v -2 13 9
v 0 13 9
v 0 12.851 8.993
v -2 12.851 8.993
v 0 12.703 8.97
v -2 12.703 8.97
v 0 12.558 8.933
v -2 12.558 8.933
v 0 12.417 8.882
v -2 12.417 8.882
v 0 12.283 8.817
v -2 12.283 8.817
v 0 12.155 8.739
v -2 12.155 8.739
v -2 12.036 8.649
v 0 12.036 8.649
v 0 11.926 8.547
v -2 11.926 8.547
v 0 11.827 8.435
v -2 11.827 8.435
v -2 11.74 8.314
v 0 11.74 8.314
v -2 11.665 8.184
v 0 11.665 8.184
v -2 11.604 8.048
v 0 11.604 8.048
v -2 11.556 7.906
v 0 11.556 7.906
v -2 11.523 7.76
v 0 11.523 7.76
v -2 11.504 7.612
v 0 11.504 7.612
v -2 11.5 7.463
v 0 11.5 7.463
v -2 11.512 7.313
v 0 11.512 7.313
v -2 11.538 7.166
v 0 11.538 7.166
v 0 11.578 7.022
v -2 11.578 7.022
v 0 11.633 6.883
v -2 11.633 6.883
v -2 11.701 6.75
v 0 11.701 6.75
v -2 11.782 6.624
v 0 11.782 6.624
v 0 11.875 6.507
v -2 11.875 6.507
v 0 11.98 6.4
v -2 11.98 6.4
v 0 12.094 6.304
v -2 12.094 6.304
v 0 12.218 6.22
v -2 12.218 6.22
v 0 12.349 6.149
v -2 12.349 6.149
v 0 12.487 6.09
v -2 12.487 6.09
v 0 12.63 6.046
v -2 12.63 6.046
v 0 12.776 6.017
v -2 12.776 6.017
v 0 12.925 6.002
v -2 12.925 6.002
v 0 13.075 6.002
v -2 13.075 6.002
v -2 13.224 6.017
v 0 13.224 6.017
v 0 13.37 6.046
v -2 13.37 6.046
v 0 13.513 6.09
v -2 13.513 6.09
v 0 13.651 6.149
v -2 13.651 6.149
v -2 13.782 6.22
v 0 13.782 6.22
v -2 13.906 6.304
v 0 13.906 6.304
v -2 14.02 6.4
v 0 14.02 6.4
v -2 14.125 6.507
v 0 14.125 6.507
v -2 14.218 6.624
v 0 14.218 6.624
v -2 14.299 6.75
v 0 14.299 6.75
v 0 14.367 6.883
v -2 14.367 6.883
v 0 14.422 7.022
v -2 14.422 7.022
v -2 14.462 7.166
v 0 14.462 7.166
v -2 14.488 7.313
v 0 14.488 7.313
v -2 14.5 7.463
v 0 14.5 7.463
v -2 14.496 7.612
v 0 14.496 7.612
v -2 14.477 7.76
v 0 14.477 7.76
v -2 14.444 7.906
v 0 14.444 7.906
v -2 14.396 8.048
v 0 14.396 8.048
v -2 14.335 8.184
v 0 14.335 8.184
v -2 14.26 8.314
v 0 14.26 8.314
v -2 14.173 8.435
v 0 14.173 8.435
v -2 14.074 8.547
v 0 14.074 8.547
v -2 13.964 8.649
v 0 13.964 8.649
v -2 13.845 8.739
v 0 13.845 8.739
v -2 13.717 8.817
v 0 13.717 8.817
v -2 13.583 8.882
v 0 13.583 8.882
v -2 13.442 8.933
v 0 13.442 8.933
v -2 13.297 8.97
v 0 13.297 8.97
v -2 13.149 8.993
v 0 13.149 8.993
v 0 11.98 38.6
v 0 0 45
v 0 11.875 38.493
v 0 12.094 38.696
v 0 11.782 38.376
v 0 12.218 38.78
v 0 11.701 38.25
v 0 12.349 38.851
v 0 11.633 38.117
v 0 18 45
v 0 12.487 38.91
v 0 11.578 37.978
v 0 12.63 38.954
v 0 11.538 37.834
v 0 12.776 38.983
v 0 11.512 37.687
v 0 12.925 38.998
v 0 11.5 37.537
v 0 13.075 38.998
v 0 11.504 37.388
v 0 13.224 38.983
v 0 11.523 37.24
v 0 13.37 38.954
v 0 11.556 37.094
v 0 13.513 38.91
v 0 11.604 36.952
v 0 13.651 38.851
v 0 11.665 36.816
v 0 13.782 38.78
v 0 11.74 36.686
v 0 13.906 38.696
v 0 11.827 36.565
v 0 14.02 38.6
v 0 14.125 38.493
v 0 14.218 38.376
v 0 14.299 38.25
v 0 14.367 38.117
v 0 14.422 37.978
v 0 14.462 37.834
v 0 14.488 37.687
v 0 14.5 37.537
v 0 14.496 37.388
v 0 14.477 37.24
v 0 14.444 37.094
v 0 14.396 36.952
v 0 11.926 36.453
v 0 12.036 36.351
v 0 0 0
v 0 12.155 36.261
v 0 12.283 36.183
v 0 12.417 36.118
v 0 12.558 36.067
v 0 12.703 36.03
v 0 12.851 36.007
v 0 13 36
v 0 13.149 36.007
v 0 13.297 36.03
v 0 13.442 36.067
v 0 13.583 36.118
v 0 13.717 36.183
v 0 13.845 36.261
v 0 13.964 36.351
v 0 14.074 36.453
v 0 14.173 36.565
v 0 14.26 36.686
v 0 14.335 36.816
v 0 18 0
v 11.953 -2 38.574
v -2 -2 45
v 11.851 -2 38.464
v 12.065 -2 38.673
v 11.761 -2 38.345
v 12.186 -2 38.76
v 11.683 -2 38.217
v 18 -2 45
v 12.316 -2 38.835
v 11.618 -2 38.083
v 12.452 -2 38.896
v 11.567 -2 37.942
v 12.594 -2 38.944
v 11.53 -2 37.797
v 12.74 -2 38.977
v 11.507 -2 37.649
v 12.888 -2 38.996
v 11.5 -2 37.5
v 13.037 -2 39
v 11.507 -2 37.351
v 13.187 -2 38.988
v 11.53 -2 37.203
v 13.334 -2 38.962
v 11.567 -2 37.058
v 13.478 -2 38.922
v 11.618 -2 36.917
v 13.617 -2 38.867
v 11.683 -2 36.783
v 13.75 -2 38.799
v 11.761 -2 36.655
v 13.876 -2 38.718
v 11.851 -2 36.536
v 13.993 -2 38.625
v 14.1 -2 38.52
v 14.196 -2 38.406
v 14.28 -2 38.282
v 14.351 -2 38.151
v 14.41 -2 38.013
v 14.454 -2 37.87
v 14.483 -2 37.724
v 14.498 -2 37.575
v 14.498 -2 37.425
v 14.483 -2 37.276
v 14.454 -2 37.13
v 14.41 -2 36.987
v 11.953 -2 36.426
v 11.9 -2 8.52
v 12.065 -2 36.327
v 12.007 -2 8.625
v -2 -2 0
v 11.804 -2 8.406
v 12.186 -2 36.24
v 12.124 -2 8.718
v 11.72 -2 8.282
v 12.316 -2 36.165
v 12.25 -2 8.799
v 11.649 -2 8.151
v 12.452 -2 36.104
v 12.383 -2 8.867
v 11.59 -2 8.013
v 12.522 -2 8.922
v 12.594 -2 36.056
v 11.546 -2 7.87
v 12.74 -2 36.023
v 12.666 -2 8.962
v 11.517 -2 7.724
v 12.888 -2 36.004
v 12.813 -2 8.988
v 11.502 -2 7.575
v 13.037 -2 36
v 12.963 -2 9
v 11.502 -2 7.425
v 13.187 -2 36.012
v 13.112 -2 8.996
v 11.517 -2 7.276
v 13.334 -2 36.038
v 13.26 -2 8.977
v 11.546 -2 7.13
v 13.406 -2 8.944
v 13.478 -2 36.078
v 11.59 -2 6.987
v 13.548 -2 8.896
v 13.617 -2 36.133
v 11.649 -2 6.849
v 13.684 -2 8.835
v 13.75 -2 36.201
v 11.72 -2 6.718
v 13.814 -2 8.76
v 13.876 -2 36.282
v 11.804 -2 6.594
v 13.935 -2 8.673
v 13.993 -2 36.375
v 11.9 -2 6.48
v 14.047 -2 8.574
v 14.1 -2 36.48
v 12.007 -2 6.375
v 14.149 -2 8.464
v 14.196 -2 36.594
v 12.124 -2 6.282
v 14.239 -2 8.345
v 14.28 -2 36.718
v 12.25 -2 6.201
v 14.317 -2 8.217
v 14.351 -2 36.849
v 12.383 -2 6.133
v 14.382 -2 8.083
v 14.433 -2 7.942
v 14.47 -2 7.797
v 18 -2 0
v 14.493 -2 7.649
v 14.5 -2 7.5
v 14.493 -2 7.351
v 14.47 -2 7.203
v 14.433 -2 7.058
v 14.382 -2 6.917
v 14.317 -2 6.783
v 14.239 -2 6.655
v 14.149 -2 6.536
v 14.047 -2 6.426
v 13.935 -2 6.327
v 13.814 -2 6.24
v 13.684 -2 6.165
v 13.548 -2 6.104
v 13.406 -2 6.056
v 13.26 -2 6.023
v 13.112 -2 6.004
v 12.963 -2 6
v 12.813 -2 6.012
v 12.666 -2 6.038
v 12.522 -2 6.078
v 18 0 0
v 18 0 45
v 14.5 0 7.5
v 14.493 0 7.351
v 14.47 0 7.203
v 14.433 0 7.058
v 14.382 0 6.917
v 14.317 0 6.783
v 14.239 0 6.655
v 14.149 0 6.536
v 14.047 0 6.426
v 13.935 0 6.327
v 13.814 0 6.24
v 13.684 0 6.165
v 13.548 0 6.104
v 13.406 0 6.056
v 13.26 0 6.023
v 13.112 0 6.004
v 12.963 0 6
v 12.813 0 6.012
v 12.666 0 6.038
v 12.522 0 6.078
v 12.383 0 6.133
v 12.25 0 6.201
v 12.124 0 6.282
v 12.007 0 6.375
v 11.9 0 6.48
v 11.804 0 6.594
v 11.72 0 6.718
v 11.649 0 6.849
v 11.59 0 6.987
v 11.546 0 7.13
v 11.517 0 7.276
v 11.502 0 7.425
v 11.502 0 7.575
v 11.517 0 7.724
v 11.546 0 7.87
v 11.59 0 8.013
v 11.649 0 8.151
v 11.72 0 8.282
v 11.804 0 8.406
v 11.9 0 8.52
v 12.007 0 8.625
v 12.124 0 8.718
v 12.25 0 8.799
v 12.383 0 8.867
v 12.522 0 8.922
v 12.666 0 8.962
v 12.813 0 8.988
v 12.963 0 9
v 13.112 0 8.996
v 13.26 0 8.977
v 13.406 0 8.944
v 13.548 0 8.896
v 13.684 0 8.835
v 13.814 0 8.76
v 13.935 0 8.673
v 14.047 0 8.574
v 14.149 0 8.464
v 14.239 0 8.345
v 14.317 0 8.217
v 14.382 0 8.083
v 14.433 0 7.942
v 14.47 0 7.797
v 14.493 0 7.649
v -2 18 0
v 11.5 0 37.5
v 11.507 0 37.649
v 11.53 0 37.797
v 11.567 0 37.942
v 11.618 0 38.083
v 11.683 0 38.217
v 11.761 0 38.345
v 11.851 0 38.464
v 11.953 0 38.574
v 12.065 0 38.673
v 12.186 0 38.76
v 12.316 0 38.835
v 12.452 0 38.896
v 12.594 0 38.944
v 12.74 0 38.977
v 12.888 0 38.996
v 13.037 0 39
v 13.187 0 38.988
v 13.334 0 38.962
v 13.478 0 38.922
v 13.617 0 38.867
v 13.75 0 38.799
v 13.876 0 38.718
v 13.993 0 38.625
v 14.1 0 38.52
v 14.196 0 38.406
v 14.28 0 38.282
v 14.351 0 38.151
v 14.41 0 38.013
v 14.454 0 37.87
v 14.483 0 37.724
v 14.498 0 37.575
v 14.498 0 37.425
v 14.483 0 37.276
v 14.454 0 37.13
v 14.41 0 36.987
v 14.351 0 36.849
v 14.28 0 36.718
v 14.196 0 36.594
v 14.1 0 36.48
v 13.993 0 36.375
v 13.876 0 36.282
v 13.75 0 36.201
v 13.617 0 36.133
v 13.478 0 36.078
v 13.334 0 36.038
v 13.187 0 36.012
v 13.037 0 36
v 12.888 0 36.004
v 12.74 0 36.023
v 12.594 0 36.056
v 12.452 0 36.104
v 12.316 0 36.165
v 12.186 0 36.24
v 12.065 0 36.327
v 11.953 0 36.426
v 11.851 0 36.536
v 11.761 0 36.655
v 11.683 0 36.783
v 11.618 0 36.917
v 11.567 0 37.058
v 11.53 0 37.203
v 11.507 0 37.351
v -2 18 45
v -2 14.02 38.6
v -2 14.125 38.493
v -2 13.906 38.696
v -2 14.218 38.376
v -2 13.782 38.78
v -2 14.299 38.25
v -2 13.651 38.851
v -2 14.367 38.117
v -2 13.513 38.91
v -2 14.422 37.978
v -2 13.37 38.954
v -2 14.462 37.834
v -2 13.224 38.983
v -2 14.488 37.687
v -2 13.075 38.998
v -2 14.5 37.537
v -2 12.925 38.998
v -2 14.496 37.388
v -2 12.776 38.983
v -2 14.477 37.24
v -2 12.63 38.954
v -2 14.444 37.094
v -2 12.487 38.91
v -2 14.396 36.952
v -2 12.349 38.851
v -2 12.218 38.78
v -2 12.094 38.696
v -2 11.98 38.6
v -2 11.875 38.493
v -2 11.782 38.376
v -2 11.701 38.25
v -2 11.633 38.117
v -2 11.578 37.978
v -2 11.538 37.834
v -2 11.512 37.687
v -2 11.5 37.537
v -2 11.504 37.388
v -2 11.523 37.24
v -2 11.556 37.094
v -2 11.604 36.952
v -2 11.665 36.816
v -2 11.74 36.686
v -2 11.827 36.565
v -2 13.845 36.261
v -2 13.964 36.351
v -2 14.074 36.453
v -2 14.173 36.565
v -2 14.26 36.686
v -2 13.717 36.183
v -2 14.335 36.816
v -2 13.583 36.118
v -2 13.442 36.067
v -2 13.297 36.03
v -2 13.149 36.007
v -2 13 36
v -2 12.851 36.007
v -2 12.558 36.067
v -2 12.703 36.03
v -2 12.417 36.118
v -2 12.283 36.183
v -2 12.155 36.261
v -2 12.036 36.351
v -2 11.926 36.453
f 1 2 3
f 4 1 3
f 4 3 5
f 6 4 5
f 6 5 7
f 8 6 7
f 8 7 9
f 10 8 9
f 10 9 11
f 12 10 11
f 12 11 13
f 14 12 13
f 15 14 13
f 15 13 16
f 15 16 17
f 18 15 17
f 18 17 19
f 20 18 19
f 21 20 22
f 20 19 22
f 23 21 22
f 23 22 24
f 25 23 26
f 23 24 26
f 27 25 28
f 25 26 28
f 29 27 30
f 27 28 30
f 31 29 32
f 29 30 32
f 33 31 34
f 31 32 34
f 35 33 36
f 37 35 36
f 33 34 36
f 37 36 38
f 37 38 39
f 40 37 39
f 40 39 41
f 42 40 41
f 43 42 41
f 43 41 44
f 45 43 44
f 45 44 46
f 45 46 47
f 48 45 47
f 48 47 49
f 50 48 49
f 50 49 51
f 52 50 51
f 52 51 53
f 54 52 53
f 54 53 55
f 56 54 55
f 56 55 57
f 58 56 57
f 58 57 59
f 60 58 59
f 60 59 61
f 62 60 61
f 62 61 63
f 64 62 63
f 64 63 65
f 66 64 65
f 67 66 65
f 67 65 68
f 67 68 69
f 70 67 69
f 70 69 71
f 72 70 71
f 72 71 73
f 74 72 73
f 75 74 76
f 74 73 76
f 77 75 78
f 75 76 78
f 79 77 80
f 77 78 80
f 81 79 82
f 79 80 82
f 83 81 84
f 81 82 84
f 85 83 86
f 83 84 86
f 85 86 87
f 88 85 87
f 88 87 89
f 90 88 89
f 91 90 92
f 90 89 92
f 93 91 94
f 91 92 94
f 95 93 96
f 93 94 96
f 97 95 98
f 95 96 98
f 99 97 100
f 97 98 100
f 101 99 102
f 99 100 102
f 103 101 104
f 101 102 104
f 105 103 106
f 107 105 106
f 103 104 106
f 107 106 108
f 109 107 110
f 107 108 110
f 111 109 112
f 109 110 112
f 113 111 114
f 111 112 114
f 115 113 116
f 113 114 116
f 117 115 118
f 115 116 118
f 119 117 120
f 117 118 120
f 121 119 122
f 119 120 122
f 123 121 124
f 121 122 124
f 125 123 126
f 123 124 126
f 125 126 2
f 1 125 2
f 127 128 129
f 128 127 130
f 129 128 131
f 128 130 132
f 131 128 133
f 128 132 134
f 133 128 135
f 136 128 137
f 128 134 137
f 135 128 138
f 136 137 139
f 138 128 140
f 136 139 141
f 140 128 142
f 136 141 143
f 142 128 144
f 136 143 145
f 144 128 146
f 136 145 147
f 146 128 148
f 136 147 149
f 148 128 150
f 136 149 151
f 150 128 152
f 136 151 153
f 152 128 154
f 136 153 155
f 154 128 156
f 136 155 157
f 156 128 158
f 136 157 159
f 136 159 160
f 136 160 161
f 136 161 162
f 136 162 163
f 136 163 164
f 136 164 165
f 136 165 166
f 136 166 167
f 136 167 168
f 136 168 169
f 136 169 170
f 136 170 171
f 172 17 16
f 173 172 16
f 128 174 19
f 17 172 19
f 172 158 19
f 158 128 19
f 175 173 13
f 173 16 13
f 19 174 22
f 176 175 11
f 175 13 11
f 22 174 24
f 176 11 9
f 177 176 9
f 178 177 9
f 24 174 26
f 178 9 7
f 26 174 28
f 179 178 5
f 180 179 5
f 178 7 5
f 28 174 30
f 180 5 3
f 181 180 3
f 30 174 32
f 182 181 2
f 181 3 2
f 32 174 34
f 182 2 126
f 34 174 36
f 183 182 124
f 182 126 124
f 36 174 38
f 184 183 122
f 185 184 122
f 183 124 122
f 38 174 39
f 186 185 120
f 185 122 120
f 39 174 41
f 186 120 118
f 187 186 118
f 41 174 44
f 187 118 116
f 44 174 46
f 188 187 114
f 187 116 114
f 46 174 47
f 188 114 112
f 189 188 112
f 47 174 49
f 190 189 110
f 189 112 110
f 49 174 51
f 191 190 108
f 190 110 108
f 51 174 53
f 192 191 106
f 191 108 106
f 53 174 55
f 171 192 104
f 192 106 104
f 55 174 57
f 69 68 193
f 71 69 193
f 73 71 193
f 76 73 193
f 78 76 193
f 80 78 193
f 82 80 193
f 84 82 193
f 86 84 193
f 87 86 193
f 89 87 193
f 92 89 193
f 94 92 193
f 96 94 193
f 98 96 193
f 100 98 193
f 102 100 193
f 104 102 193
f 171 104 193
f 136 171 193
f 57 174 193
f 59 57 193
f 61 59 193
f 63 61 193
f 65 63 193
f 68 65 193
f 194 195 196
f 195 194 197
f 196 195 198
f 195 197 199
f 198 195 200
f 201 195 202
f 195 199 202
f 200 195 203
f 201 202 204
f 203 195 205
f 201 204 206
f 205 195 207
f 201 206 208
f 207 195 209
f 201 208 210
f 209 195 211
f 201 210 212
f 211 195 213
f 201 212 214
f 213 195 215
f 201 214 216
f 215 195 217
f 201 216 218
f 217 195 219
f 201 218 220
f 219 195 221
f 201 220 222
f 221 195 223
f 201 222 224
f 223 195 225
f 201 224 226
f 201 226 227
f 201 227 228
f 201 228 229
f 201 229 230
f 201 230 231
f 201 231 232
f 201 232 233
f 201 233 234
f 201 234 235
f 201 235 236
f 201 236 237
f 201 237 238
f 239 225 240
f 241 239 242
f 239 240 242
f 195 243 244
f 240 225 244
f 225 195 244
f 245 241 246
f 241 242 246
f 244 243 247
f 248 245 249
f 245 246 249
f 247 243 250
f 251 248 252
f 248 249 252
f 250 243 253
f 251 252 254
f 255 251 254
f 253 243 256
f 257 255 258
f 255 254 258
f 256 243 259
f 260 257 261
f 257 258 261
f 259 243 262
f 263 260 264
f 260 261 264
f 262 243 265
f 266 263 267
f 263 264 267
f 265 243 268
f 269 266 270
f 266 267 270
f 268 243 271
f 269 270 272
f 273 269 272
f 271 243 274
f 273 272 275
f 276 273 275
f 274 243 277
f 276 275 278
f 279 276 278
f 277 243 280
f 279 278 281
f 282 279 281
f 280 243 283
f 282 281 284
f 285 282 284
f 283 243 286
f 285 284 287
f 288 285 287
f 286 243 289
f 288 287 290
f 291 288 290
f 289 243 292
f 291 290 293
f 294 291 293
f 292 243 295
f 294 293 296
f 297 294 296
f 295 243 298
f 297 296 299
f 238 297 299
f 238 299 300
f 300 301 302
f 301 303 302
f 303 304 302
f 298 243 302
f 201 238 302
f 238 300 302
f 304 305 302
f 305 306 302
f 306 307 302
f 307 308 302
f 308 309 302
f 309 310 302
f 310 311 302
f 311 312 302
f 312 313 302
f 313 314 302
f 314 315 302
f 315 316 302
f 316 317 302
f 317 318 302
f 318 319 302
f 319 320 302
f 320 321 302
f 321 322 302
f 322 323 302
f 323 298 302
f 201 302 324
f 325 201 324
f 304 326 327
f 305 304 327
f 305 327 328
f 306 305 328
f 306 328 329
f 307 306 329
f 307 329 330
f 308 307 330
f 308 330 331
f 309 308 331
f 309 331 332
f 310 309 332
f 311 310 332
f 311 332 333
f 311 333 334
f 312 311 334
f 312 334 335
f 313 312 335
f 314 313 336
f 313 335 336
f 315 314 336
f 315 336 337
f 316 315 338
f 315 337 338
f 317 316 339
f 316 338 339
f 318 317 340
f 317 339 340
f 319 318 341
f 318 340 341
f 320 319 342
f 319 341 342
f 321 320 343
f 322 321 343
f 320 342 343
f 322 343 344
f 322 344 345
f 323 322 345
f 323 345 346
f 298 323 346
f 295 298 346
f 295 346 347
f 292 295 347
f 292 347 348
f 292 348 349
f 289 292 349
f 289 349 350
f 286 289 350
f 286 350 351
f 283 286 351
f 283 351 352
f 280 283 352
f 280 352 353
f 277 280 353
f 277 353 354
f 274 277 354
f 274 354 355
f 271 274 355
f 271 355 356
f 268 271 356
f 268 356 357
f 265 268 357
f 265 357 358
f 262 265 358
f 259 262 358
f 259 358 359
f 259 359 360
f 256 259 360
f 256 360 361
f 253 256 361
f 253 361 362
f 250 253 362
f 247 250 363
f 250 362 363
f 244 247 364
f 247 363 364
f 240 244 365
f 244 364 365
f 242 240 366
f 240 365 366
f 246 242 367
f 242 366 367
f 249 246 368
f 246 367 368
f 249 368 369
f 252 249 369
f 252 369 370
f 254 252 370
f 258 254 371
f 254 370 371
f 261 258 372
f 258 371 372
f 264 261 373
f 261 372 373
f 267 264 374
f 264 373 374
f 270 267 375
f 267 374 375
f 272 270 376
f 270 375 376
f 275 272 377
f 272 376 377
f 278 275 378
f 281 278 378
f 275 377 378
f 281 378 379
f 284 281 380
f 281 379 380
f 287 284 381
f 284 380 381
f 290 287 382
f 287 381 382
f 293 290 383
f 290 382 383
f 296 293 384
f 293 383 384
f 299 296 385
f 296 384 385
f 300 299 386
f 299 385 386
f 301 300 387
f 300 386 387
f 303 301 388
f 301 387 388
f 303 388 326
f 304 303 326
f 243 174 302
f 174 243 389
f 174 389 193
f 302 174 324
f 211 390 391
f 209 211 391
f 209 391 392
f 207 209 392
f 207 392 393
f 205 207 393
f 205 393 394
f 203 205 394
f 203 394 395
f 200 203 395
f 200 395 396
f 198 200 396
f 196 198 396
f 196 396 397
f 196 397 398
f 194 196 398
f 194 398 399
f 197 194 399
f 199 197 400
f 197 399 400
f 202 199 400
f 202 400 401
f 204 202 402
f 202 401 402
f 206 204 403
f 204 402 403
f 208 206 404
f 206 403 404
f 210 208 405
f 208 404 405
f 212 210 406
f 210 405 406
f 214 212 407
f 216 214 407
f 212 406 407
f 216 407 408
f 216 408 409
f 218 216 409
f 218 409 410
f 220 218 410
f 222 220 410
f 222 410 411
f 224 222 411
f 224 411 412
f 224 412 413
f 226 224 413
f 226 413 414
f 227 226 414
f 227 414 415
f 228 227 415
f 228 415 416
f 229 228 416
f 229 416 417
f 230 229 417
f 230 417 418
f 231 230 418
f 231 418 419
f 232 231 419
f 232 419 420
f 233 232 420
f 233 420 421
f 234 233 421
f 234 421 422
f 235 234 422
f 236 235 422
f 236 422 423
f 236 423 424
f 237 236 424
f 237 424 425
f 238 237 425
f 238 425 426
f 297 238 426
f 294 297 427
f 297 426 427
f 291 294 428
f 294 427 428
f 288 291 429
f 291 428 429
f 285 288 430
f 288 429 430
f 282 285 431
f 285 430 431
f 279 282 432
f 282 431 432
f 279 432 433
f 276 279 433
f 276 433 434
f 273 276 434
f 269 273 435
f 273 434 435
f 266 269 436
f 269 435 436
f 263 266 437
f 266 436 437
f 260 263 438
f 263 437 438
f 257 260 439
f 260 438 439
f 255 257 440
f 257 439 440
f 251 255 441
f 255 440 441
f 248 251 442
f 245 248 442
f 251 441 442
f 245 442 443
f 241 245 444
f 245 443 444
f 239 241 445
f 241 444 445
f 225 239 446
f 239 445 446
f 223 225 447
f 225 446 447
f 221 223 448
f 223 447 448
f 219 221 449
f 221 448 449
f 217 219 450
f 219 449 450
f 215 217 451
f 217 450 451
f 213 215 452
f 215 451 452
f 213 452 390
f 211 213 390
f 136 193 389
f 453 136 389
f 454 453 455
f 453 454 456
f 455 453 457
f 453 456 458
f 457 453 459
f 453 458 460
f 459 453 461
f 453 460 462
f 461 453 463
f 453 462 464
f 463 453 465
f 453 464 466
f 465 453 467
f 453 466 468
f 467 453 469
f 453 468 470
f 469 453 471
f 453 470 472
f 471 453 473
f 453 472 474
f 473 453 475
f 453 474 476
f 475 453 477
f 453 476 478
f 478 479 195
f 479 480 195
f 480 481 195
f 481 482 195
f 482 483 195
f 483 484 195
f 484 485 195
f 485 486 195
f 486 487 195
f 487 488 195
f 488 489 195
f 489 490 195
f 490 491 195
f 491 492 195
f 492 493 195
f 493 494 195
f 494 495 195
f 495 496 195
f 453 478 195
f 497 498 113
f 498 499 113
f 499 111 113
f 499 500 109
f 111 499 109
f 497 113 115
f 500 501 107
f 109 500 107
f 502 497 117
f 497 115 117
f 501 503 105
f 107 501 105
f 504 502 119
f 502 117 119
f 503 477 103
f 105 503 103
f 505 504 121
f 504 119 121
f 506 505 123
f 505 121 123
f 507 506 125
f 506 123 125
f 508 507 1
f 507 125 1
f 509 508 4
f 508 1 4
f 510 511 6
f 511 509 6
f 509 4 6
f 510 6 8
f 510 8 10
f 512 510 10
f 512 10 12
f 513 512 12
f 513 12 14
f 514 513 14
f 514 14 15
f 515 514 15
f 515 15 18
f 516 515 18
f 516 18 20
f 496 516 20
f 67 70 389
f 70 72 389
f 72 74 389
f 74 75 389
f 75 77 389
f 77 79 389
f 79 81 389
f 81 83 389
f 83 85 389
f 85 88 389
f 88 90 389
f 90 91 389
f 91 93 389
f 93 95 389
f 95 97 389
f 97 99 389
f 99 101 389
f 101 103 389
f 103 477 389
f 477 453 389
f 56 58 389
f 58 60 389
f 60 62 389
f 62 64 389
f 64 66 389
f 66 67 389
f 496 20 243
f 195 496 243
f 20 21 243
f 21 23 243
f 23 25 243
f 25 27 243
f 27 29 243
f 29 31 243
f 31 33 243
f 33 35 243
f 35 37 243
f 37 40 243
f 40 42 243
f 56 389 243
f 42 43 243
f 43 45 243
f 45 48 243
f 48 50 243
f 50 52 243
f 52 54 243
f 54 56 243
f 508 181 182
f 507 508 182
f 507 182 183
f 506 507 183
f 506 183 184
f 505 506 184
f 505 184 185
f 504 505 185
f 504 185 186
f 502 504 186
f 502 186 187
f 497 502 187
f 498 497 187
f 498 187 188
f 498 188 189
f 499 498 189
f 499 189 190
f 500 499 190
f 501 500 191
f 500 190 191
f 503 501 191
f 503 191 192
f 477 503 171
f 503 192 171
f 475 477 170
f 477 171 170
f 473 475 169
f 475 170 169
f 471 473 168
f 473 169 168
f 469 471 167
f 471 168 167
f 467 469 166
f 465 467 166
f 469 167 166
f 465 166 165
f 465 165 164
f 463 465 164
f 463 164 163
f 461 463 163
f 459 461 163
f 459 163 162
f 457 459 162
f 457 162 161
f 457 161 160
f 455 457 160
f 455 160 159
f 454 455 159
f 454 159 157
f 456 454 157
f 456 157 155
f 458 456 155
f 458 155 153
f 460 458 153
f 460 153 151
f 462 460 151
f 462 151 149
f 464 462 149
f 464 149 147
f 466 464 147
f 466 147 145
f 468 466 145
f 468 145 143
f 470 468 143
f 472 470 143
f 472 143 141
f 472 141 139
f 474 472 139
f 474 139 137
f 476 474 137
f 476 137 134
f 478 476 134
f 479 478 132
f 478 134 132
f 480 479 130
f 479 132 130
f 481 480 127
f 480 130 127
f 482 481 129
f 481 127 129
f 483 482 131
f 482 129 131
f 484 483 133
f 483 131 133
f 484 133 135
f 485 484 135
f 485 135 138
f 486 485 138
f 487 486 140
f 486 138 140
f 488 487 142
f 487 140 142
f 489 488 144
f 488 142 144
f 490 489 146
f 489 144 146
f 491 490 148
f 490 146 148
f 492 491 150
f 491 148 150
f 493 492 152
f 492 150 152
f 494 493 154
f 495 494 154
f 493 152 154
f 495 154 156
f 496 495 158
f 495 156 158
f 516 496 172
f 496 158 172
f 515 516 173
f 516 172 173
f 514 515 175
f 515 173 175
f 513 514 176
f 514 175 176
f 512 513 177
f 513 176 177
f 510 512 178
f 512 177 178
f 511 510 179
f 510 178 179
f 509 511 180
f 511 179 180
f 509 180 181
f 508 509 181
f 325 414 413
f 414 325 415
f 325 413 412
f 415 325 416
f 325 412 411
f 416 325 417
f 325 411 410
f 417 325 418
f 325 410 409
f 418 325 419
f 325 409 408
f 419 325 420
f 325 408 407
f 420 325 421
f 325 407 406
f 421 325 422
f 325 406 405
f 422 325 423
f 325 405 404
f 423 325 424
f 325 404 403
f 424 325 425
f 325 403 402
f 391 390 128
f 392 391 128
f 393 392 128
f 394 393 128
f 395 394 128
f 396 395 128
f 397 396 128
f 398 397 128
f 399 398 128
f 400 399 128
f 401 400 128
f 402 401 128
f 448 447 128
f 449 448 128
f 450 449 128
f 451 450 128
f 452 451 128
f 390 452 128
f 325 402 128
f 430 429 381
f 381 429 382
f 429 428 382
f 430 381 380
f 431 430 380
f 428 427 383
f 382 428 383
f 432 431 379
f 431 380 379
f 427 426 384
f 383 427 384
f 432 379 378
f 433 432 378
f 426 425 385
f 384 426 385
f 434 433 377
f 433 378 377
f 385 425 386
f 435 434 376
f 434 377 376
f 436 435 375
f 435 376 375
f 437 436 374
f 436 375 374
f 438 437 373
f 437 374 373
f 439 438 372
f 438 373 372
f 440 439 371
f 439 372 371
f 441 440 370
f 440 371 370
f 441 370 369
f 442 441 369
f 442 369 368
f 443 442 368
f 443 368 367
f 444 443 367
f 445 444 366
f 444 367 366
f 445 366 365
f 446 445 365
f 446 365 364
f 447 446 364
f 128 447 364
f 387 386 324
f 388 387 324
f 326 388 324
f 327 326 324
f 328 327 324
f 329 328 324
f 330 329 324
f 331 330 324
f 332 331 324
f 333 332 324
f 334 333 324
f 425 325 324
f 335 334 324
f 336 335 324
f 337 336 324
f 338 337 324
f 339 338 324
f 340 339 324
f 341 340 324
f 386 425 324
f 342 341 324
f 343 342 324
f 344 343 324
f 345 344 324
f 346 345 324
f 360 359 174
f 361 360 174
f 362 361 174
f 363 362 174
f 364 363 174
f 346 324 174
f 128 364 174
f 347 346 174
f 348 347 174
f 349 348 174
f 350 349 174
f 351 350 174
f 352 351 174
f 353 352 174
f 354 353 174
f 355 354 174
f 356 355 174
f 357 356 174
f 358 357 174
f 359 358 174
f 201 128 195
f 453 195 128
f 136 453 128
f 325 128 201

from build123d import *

# Parameters (mm, degrees)
EXTRUDE_1_DEPTH     = 45
SKETCH_2_R          = 1.5
CUT_EXTRUDE_1_DEPTH = 52.701063819
SKETCH_3_R          = 1.5
CUT_EXTRUDE_2_DEPTH = 52.701063819


with BuildPart() as part:
    # 草图1 → 凸台-拉伸1 (new body)
    with BuildSketch(Plane.XY):
        Polygon((0, 0), (0, 18), (-2, 18), (-2, -2), (18, -2), (18, 0), align=None)
    extrude(amount=EXTRUDE_1_DEPTH)

    # 草图2 → 切除-拉伸1 (cut, through all)
    with BuildSketch(Plane(origin=(0, 0, 0), x_dir=(0, 0, -1), z_dir=(1, 0, 0))):
        with Locations((-37.5, 13)):
            Circle(SKETCH_2_R)
        with Locations(Location((-7.5, 13, 0), (0, 0, 180))):
            Circle(SKETCH_2_R)
    extrude(amount=-CUT_EXTRUDE_1_DEPTH, mode=Mode.SUBTRACT)

    # 草图3 → 切除-拉伸2 (cut, through all)
    with BuildSketch(Plane(origin=(0, 0, 0), x_dir=(1, 0, 0), z_dir=(0, 1, 0))):
        with Locations(Location((13, -37.5, 0), (0, 0, 180))):
            Circle(SKETCH_3_R)
        with Locations((13, -7.5)):
            Circle(SKETCH_3_R)
    extrude(amount=-CUT_EXTRUDE_2_DEPTH, mode=Mode.SUBTRACT)


solid = part.part
